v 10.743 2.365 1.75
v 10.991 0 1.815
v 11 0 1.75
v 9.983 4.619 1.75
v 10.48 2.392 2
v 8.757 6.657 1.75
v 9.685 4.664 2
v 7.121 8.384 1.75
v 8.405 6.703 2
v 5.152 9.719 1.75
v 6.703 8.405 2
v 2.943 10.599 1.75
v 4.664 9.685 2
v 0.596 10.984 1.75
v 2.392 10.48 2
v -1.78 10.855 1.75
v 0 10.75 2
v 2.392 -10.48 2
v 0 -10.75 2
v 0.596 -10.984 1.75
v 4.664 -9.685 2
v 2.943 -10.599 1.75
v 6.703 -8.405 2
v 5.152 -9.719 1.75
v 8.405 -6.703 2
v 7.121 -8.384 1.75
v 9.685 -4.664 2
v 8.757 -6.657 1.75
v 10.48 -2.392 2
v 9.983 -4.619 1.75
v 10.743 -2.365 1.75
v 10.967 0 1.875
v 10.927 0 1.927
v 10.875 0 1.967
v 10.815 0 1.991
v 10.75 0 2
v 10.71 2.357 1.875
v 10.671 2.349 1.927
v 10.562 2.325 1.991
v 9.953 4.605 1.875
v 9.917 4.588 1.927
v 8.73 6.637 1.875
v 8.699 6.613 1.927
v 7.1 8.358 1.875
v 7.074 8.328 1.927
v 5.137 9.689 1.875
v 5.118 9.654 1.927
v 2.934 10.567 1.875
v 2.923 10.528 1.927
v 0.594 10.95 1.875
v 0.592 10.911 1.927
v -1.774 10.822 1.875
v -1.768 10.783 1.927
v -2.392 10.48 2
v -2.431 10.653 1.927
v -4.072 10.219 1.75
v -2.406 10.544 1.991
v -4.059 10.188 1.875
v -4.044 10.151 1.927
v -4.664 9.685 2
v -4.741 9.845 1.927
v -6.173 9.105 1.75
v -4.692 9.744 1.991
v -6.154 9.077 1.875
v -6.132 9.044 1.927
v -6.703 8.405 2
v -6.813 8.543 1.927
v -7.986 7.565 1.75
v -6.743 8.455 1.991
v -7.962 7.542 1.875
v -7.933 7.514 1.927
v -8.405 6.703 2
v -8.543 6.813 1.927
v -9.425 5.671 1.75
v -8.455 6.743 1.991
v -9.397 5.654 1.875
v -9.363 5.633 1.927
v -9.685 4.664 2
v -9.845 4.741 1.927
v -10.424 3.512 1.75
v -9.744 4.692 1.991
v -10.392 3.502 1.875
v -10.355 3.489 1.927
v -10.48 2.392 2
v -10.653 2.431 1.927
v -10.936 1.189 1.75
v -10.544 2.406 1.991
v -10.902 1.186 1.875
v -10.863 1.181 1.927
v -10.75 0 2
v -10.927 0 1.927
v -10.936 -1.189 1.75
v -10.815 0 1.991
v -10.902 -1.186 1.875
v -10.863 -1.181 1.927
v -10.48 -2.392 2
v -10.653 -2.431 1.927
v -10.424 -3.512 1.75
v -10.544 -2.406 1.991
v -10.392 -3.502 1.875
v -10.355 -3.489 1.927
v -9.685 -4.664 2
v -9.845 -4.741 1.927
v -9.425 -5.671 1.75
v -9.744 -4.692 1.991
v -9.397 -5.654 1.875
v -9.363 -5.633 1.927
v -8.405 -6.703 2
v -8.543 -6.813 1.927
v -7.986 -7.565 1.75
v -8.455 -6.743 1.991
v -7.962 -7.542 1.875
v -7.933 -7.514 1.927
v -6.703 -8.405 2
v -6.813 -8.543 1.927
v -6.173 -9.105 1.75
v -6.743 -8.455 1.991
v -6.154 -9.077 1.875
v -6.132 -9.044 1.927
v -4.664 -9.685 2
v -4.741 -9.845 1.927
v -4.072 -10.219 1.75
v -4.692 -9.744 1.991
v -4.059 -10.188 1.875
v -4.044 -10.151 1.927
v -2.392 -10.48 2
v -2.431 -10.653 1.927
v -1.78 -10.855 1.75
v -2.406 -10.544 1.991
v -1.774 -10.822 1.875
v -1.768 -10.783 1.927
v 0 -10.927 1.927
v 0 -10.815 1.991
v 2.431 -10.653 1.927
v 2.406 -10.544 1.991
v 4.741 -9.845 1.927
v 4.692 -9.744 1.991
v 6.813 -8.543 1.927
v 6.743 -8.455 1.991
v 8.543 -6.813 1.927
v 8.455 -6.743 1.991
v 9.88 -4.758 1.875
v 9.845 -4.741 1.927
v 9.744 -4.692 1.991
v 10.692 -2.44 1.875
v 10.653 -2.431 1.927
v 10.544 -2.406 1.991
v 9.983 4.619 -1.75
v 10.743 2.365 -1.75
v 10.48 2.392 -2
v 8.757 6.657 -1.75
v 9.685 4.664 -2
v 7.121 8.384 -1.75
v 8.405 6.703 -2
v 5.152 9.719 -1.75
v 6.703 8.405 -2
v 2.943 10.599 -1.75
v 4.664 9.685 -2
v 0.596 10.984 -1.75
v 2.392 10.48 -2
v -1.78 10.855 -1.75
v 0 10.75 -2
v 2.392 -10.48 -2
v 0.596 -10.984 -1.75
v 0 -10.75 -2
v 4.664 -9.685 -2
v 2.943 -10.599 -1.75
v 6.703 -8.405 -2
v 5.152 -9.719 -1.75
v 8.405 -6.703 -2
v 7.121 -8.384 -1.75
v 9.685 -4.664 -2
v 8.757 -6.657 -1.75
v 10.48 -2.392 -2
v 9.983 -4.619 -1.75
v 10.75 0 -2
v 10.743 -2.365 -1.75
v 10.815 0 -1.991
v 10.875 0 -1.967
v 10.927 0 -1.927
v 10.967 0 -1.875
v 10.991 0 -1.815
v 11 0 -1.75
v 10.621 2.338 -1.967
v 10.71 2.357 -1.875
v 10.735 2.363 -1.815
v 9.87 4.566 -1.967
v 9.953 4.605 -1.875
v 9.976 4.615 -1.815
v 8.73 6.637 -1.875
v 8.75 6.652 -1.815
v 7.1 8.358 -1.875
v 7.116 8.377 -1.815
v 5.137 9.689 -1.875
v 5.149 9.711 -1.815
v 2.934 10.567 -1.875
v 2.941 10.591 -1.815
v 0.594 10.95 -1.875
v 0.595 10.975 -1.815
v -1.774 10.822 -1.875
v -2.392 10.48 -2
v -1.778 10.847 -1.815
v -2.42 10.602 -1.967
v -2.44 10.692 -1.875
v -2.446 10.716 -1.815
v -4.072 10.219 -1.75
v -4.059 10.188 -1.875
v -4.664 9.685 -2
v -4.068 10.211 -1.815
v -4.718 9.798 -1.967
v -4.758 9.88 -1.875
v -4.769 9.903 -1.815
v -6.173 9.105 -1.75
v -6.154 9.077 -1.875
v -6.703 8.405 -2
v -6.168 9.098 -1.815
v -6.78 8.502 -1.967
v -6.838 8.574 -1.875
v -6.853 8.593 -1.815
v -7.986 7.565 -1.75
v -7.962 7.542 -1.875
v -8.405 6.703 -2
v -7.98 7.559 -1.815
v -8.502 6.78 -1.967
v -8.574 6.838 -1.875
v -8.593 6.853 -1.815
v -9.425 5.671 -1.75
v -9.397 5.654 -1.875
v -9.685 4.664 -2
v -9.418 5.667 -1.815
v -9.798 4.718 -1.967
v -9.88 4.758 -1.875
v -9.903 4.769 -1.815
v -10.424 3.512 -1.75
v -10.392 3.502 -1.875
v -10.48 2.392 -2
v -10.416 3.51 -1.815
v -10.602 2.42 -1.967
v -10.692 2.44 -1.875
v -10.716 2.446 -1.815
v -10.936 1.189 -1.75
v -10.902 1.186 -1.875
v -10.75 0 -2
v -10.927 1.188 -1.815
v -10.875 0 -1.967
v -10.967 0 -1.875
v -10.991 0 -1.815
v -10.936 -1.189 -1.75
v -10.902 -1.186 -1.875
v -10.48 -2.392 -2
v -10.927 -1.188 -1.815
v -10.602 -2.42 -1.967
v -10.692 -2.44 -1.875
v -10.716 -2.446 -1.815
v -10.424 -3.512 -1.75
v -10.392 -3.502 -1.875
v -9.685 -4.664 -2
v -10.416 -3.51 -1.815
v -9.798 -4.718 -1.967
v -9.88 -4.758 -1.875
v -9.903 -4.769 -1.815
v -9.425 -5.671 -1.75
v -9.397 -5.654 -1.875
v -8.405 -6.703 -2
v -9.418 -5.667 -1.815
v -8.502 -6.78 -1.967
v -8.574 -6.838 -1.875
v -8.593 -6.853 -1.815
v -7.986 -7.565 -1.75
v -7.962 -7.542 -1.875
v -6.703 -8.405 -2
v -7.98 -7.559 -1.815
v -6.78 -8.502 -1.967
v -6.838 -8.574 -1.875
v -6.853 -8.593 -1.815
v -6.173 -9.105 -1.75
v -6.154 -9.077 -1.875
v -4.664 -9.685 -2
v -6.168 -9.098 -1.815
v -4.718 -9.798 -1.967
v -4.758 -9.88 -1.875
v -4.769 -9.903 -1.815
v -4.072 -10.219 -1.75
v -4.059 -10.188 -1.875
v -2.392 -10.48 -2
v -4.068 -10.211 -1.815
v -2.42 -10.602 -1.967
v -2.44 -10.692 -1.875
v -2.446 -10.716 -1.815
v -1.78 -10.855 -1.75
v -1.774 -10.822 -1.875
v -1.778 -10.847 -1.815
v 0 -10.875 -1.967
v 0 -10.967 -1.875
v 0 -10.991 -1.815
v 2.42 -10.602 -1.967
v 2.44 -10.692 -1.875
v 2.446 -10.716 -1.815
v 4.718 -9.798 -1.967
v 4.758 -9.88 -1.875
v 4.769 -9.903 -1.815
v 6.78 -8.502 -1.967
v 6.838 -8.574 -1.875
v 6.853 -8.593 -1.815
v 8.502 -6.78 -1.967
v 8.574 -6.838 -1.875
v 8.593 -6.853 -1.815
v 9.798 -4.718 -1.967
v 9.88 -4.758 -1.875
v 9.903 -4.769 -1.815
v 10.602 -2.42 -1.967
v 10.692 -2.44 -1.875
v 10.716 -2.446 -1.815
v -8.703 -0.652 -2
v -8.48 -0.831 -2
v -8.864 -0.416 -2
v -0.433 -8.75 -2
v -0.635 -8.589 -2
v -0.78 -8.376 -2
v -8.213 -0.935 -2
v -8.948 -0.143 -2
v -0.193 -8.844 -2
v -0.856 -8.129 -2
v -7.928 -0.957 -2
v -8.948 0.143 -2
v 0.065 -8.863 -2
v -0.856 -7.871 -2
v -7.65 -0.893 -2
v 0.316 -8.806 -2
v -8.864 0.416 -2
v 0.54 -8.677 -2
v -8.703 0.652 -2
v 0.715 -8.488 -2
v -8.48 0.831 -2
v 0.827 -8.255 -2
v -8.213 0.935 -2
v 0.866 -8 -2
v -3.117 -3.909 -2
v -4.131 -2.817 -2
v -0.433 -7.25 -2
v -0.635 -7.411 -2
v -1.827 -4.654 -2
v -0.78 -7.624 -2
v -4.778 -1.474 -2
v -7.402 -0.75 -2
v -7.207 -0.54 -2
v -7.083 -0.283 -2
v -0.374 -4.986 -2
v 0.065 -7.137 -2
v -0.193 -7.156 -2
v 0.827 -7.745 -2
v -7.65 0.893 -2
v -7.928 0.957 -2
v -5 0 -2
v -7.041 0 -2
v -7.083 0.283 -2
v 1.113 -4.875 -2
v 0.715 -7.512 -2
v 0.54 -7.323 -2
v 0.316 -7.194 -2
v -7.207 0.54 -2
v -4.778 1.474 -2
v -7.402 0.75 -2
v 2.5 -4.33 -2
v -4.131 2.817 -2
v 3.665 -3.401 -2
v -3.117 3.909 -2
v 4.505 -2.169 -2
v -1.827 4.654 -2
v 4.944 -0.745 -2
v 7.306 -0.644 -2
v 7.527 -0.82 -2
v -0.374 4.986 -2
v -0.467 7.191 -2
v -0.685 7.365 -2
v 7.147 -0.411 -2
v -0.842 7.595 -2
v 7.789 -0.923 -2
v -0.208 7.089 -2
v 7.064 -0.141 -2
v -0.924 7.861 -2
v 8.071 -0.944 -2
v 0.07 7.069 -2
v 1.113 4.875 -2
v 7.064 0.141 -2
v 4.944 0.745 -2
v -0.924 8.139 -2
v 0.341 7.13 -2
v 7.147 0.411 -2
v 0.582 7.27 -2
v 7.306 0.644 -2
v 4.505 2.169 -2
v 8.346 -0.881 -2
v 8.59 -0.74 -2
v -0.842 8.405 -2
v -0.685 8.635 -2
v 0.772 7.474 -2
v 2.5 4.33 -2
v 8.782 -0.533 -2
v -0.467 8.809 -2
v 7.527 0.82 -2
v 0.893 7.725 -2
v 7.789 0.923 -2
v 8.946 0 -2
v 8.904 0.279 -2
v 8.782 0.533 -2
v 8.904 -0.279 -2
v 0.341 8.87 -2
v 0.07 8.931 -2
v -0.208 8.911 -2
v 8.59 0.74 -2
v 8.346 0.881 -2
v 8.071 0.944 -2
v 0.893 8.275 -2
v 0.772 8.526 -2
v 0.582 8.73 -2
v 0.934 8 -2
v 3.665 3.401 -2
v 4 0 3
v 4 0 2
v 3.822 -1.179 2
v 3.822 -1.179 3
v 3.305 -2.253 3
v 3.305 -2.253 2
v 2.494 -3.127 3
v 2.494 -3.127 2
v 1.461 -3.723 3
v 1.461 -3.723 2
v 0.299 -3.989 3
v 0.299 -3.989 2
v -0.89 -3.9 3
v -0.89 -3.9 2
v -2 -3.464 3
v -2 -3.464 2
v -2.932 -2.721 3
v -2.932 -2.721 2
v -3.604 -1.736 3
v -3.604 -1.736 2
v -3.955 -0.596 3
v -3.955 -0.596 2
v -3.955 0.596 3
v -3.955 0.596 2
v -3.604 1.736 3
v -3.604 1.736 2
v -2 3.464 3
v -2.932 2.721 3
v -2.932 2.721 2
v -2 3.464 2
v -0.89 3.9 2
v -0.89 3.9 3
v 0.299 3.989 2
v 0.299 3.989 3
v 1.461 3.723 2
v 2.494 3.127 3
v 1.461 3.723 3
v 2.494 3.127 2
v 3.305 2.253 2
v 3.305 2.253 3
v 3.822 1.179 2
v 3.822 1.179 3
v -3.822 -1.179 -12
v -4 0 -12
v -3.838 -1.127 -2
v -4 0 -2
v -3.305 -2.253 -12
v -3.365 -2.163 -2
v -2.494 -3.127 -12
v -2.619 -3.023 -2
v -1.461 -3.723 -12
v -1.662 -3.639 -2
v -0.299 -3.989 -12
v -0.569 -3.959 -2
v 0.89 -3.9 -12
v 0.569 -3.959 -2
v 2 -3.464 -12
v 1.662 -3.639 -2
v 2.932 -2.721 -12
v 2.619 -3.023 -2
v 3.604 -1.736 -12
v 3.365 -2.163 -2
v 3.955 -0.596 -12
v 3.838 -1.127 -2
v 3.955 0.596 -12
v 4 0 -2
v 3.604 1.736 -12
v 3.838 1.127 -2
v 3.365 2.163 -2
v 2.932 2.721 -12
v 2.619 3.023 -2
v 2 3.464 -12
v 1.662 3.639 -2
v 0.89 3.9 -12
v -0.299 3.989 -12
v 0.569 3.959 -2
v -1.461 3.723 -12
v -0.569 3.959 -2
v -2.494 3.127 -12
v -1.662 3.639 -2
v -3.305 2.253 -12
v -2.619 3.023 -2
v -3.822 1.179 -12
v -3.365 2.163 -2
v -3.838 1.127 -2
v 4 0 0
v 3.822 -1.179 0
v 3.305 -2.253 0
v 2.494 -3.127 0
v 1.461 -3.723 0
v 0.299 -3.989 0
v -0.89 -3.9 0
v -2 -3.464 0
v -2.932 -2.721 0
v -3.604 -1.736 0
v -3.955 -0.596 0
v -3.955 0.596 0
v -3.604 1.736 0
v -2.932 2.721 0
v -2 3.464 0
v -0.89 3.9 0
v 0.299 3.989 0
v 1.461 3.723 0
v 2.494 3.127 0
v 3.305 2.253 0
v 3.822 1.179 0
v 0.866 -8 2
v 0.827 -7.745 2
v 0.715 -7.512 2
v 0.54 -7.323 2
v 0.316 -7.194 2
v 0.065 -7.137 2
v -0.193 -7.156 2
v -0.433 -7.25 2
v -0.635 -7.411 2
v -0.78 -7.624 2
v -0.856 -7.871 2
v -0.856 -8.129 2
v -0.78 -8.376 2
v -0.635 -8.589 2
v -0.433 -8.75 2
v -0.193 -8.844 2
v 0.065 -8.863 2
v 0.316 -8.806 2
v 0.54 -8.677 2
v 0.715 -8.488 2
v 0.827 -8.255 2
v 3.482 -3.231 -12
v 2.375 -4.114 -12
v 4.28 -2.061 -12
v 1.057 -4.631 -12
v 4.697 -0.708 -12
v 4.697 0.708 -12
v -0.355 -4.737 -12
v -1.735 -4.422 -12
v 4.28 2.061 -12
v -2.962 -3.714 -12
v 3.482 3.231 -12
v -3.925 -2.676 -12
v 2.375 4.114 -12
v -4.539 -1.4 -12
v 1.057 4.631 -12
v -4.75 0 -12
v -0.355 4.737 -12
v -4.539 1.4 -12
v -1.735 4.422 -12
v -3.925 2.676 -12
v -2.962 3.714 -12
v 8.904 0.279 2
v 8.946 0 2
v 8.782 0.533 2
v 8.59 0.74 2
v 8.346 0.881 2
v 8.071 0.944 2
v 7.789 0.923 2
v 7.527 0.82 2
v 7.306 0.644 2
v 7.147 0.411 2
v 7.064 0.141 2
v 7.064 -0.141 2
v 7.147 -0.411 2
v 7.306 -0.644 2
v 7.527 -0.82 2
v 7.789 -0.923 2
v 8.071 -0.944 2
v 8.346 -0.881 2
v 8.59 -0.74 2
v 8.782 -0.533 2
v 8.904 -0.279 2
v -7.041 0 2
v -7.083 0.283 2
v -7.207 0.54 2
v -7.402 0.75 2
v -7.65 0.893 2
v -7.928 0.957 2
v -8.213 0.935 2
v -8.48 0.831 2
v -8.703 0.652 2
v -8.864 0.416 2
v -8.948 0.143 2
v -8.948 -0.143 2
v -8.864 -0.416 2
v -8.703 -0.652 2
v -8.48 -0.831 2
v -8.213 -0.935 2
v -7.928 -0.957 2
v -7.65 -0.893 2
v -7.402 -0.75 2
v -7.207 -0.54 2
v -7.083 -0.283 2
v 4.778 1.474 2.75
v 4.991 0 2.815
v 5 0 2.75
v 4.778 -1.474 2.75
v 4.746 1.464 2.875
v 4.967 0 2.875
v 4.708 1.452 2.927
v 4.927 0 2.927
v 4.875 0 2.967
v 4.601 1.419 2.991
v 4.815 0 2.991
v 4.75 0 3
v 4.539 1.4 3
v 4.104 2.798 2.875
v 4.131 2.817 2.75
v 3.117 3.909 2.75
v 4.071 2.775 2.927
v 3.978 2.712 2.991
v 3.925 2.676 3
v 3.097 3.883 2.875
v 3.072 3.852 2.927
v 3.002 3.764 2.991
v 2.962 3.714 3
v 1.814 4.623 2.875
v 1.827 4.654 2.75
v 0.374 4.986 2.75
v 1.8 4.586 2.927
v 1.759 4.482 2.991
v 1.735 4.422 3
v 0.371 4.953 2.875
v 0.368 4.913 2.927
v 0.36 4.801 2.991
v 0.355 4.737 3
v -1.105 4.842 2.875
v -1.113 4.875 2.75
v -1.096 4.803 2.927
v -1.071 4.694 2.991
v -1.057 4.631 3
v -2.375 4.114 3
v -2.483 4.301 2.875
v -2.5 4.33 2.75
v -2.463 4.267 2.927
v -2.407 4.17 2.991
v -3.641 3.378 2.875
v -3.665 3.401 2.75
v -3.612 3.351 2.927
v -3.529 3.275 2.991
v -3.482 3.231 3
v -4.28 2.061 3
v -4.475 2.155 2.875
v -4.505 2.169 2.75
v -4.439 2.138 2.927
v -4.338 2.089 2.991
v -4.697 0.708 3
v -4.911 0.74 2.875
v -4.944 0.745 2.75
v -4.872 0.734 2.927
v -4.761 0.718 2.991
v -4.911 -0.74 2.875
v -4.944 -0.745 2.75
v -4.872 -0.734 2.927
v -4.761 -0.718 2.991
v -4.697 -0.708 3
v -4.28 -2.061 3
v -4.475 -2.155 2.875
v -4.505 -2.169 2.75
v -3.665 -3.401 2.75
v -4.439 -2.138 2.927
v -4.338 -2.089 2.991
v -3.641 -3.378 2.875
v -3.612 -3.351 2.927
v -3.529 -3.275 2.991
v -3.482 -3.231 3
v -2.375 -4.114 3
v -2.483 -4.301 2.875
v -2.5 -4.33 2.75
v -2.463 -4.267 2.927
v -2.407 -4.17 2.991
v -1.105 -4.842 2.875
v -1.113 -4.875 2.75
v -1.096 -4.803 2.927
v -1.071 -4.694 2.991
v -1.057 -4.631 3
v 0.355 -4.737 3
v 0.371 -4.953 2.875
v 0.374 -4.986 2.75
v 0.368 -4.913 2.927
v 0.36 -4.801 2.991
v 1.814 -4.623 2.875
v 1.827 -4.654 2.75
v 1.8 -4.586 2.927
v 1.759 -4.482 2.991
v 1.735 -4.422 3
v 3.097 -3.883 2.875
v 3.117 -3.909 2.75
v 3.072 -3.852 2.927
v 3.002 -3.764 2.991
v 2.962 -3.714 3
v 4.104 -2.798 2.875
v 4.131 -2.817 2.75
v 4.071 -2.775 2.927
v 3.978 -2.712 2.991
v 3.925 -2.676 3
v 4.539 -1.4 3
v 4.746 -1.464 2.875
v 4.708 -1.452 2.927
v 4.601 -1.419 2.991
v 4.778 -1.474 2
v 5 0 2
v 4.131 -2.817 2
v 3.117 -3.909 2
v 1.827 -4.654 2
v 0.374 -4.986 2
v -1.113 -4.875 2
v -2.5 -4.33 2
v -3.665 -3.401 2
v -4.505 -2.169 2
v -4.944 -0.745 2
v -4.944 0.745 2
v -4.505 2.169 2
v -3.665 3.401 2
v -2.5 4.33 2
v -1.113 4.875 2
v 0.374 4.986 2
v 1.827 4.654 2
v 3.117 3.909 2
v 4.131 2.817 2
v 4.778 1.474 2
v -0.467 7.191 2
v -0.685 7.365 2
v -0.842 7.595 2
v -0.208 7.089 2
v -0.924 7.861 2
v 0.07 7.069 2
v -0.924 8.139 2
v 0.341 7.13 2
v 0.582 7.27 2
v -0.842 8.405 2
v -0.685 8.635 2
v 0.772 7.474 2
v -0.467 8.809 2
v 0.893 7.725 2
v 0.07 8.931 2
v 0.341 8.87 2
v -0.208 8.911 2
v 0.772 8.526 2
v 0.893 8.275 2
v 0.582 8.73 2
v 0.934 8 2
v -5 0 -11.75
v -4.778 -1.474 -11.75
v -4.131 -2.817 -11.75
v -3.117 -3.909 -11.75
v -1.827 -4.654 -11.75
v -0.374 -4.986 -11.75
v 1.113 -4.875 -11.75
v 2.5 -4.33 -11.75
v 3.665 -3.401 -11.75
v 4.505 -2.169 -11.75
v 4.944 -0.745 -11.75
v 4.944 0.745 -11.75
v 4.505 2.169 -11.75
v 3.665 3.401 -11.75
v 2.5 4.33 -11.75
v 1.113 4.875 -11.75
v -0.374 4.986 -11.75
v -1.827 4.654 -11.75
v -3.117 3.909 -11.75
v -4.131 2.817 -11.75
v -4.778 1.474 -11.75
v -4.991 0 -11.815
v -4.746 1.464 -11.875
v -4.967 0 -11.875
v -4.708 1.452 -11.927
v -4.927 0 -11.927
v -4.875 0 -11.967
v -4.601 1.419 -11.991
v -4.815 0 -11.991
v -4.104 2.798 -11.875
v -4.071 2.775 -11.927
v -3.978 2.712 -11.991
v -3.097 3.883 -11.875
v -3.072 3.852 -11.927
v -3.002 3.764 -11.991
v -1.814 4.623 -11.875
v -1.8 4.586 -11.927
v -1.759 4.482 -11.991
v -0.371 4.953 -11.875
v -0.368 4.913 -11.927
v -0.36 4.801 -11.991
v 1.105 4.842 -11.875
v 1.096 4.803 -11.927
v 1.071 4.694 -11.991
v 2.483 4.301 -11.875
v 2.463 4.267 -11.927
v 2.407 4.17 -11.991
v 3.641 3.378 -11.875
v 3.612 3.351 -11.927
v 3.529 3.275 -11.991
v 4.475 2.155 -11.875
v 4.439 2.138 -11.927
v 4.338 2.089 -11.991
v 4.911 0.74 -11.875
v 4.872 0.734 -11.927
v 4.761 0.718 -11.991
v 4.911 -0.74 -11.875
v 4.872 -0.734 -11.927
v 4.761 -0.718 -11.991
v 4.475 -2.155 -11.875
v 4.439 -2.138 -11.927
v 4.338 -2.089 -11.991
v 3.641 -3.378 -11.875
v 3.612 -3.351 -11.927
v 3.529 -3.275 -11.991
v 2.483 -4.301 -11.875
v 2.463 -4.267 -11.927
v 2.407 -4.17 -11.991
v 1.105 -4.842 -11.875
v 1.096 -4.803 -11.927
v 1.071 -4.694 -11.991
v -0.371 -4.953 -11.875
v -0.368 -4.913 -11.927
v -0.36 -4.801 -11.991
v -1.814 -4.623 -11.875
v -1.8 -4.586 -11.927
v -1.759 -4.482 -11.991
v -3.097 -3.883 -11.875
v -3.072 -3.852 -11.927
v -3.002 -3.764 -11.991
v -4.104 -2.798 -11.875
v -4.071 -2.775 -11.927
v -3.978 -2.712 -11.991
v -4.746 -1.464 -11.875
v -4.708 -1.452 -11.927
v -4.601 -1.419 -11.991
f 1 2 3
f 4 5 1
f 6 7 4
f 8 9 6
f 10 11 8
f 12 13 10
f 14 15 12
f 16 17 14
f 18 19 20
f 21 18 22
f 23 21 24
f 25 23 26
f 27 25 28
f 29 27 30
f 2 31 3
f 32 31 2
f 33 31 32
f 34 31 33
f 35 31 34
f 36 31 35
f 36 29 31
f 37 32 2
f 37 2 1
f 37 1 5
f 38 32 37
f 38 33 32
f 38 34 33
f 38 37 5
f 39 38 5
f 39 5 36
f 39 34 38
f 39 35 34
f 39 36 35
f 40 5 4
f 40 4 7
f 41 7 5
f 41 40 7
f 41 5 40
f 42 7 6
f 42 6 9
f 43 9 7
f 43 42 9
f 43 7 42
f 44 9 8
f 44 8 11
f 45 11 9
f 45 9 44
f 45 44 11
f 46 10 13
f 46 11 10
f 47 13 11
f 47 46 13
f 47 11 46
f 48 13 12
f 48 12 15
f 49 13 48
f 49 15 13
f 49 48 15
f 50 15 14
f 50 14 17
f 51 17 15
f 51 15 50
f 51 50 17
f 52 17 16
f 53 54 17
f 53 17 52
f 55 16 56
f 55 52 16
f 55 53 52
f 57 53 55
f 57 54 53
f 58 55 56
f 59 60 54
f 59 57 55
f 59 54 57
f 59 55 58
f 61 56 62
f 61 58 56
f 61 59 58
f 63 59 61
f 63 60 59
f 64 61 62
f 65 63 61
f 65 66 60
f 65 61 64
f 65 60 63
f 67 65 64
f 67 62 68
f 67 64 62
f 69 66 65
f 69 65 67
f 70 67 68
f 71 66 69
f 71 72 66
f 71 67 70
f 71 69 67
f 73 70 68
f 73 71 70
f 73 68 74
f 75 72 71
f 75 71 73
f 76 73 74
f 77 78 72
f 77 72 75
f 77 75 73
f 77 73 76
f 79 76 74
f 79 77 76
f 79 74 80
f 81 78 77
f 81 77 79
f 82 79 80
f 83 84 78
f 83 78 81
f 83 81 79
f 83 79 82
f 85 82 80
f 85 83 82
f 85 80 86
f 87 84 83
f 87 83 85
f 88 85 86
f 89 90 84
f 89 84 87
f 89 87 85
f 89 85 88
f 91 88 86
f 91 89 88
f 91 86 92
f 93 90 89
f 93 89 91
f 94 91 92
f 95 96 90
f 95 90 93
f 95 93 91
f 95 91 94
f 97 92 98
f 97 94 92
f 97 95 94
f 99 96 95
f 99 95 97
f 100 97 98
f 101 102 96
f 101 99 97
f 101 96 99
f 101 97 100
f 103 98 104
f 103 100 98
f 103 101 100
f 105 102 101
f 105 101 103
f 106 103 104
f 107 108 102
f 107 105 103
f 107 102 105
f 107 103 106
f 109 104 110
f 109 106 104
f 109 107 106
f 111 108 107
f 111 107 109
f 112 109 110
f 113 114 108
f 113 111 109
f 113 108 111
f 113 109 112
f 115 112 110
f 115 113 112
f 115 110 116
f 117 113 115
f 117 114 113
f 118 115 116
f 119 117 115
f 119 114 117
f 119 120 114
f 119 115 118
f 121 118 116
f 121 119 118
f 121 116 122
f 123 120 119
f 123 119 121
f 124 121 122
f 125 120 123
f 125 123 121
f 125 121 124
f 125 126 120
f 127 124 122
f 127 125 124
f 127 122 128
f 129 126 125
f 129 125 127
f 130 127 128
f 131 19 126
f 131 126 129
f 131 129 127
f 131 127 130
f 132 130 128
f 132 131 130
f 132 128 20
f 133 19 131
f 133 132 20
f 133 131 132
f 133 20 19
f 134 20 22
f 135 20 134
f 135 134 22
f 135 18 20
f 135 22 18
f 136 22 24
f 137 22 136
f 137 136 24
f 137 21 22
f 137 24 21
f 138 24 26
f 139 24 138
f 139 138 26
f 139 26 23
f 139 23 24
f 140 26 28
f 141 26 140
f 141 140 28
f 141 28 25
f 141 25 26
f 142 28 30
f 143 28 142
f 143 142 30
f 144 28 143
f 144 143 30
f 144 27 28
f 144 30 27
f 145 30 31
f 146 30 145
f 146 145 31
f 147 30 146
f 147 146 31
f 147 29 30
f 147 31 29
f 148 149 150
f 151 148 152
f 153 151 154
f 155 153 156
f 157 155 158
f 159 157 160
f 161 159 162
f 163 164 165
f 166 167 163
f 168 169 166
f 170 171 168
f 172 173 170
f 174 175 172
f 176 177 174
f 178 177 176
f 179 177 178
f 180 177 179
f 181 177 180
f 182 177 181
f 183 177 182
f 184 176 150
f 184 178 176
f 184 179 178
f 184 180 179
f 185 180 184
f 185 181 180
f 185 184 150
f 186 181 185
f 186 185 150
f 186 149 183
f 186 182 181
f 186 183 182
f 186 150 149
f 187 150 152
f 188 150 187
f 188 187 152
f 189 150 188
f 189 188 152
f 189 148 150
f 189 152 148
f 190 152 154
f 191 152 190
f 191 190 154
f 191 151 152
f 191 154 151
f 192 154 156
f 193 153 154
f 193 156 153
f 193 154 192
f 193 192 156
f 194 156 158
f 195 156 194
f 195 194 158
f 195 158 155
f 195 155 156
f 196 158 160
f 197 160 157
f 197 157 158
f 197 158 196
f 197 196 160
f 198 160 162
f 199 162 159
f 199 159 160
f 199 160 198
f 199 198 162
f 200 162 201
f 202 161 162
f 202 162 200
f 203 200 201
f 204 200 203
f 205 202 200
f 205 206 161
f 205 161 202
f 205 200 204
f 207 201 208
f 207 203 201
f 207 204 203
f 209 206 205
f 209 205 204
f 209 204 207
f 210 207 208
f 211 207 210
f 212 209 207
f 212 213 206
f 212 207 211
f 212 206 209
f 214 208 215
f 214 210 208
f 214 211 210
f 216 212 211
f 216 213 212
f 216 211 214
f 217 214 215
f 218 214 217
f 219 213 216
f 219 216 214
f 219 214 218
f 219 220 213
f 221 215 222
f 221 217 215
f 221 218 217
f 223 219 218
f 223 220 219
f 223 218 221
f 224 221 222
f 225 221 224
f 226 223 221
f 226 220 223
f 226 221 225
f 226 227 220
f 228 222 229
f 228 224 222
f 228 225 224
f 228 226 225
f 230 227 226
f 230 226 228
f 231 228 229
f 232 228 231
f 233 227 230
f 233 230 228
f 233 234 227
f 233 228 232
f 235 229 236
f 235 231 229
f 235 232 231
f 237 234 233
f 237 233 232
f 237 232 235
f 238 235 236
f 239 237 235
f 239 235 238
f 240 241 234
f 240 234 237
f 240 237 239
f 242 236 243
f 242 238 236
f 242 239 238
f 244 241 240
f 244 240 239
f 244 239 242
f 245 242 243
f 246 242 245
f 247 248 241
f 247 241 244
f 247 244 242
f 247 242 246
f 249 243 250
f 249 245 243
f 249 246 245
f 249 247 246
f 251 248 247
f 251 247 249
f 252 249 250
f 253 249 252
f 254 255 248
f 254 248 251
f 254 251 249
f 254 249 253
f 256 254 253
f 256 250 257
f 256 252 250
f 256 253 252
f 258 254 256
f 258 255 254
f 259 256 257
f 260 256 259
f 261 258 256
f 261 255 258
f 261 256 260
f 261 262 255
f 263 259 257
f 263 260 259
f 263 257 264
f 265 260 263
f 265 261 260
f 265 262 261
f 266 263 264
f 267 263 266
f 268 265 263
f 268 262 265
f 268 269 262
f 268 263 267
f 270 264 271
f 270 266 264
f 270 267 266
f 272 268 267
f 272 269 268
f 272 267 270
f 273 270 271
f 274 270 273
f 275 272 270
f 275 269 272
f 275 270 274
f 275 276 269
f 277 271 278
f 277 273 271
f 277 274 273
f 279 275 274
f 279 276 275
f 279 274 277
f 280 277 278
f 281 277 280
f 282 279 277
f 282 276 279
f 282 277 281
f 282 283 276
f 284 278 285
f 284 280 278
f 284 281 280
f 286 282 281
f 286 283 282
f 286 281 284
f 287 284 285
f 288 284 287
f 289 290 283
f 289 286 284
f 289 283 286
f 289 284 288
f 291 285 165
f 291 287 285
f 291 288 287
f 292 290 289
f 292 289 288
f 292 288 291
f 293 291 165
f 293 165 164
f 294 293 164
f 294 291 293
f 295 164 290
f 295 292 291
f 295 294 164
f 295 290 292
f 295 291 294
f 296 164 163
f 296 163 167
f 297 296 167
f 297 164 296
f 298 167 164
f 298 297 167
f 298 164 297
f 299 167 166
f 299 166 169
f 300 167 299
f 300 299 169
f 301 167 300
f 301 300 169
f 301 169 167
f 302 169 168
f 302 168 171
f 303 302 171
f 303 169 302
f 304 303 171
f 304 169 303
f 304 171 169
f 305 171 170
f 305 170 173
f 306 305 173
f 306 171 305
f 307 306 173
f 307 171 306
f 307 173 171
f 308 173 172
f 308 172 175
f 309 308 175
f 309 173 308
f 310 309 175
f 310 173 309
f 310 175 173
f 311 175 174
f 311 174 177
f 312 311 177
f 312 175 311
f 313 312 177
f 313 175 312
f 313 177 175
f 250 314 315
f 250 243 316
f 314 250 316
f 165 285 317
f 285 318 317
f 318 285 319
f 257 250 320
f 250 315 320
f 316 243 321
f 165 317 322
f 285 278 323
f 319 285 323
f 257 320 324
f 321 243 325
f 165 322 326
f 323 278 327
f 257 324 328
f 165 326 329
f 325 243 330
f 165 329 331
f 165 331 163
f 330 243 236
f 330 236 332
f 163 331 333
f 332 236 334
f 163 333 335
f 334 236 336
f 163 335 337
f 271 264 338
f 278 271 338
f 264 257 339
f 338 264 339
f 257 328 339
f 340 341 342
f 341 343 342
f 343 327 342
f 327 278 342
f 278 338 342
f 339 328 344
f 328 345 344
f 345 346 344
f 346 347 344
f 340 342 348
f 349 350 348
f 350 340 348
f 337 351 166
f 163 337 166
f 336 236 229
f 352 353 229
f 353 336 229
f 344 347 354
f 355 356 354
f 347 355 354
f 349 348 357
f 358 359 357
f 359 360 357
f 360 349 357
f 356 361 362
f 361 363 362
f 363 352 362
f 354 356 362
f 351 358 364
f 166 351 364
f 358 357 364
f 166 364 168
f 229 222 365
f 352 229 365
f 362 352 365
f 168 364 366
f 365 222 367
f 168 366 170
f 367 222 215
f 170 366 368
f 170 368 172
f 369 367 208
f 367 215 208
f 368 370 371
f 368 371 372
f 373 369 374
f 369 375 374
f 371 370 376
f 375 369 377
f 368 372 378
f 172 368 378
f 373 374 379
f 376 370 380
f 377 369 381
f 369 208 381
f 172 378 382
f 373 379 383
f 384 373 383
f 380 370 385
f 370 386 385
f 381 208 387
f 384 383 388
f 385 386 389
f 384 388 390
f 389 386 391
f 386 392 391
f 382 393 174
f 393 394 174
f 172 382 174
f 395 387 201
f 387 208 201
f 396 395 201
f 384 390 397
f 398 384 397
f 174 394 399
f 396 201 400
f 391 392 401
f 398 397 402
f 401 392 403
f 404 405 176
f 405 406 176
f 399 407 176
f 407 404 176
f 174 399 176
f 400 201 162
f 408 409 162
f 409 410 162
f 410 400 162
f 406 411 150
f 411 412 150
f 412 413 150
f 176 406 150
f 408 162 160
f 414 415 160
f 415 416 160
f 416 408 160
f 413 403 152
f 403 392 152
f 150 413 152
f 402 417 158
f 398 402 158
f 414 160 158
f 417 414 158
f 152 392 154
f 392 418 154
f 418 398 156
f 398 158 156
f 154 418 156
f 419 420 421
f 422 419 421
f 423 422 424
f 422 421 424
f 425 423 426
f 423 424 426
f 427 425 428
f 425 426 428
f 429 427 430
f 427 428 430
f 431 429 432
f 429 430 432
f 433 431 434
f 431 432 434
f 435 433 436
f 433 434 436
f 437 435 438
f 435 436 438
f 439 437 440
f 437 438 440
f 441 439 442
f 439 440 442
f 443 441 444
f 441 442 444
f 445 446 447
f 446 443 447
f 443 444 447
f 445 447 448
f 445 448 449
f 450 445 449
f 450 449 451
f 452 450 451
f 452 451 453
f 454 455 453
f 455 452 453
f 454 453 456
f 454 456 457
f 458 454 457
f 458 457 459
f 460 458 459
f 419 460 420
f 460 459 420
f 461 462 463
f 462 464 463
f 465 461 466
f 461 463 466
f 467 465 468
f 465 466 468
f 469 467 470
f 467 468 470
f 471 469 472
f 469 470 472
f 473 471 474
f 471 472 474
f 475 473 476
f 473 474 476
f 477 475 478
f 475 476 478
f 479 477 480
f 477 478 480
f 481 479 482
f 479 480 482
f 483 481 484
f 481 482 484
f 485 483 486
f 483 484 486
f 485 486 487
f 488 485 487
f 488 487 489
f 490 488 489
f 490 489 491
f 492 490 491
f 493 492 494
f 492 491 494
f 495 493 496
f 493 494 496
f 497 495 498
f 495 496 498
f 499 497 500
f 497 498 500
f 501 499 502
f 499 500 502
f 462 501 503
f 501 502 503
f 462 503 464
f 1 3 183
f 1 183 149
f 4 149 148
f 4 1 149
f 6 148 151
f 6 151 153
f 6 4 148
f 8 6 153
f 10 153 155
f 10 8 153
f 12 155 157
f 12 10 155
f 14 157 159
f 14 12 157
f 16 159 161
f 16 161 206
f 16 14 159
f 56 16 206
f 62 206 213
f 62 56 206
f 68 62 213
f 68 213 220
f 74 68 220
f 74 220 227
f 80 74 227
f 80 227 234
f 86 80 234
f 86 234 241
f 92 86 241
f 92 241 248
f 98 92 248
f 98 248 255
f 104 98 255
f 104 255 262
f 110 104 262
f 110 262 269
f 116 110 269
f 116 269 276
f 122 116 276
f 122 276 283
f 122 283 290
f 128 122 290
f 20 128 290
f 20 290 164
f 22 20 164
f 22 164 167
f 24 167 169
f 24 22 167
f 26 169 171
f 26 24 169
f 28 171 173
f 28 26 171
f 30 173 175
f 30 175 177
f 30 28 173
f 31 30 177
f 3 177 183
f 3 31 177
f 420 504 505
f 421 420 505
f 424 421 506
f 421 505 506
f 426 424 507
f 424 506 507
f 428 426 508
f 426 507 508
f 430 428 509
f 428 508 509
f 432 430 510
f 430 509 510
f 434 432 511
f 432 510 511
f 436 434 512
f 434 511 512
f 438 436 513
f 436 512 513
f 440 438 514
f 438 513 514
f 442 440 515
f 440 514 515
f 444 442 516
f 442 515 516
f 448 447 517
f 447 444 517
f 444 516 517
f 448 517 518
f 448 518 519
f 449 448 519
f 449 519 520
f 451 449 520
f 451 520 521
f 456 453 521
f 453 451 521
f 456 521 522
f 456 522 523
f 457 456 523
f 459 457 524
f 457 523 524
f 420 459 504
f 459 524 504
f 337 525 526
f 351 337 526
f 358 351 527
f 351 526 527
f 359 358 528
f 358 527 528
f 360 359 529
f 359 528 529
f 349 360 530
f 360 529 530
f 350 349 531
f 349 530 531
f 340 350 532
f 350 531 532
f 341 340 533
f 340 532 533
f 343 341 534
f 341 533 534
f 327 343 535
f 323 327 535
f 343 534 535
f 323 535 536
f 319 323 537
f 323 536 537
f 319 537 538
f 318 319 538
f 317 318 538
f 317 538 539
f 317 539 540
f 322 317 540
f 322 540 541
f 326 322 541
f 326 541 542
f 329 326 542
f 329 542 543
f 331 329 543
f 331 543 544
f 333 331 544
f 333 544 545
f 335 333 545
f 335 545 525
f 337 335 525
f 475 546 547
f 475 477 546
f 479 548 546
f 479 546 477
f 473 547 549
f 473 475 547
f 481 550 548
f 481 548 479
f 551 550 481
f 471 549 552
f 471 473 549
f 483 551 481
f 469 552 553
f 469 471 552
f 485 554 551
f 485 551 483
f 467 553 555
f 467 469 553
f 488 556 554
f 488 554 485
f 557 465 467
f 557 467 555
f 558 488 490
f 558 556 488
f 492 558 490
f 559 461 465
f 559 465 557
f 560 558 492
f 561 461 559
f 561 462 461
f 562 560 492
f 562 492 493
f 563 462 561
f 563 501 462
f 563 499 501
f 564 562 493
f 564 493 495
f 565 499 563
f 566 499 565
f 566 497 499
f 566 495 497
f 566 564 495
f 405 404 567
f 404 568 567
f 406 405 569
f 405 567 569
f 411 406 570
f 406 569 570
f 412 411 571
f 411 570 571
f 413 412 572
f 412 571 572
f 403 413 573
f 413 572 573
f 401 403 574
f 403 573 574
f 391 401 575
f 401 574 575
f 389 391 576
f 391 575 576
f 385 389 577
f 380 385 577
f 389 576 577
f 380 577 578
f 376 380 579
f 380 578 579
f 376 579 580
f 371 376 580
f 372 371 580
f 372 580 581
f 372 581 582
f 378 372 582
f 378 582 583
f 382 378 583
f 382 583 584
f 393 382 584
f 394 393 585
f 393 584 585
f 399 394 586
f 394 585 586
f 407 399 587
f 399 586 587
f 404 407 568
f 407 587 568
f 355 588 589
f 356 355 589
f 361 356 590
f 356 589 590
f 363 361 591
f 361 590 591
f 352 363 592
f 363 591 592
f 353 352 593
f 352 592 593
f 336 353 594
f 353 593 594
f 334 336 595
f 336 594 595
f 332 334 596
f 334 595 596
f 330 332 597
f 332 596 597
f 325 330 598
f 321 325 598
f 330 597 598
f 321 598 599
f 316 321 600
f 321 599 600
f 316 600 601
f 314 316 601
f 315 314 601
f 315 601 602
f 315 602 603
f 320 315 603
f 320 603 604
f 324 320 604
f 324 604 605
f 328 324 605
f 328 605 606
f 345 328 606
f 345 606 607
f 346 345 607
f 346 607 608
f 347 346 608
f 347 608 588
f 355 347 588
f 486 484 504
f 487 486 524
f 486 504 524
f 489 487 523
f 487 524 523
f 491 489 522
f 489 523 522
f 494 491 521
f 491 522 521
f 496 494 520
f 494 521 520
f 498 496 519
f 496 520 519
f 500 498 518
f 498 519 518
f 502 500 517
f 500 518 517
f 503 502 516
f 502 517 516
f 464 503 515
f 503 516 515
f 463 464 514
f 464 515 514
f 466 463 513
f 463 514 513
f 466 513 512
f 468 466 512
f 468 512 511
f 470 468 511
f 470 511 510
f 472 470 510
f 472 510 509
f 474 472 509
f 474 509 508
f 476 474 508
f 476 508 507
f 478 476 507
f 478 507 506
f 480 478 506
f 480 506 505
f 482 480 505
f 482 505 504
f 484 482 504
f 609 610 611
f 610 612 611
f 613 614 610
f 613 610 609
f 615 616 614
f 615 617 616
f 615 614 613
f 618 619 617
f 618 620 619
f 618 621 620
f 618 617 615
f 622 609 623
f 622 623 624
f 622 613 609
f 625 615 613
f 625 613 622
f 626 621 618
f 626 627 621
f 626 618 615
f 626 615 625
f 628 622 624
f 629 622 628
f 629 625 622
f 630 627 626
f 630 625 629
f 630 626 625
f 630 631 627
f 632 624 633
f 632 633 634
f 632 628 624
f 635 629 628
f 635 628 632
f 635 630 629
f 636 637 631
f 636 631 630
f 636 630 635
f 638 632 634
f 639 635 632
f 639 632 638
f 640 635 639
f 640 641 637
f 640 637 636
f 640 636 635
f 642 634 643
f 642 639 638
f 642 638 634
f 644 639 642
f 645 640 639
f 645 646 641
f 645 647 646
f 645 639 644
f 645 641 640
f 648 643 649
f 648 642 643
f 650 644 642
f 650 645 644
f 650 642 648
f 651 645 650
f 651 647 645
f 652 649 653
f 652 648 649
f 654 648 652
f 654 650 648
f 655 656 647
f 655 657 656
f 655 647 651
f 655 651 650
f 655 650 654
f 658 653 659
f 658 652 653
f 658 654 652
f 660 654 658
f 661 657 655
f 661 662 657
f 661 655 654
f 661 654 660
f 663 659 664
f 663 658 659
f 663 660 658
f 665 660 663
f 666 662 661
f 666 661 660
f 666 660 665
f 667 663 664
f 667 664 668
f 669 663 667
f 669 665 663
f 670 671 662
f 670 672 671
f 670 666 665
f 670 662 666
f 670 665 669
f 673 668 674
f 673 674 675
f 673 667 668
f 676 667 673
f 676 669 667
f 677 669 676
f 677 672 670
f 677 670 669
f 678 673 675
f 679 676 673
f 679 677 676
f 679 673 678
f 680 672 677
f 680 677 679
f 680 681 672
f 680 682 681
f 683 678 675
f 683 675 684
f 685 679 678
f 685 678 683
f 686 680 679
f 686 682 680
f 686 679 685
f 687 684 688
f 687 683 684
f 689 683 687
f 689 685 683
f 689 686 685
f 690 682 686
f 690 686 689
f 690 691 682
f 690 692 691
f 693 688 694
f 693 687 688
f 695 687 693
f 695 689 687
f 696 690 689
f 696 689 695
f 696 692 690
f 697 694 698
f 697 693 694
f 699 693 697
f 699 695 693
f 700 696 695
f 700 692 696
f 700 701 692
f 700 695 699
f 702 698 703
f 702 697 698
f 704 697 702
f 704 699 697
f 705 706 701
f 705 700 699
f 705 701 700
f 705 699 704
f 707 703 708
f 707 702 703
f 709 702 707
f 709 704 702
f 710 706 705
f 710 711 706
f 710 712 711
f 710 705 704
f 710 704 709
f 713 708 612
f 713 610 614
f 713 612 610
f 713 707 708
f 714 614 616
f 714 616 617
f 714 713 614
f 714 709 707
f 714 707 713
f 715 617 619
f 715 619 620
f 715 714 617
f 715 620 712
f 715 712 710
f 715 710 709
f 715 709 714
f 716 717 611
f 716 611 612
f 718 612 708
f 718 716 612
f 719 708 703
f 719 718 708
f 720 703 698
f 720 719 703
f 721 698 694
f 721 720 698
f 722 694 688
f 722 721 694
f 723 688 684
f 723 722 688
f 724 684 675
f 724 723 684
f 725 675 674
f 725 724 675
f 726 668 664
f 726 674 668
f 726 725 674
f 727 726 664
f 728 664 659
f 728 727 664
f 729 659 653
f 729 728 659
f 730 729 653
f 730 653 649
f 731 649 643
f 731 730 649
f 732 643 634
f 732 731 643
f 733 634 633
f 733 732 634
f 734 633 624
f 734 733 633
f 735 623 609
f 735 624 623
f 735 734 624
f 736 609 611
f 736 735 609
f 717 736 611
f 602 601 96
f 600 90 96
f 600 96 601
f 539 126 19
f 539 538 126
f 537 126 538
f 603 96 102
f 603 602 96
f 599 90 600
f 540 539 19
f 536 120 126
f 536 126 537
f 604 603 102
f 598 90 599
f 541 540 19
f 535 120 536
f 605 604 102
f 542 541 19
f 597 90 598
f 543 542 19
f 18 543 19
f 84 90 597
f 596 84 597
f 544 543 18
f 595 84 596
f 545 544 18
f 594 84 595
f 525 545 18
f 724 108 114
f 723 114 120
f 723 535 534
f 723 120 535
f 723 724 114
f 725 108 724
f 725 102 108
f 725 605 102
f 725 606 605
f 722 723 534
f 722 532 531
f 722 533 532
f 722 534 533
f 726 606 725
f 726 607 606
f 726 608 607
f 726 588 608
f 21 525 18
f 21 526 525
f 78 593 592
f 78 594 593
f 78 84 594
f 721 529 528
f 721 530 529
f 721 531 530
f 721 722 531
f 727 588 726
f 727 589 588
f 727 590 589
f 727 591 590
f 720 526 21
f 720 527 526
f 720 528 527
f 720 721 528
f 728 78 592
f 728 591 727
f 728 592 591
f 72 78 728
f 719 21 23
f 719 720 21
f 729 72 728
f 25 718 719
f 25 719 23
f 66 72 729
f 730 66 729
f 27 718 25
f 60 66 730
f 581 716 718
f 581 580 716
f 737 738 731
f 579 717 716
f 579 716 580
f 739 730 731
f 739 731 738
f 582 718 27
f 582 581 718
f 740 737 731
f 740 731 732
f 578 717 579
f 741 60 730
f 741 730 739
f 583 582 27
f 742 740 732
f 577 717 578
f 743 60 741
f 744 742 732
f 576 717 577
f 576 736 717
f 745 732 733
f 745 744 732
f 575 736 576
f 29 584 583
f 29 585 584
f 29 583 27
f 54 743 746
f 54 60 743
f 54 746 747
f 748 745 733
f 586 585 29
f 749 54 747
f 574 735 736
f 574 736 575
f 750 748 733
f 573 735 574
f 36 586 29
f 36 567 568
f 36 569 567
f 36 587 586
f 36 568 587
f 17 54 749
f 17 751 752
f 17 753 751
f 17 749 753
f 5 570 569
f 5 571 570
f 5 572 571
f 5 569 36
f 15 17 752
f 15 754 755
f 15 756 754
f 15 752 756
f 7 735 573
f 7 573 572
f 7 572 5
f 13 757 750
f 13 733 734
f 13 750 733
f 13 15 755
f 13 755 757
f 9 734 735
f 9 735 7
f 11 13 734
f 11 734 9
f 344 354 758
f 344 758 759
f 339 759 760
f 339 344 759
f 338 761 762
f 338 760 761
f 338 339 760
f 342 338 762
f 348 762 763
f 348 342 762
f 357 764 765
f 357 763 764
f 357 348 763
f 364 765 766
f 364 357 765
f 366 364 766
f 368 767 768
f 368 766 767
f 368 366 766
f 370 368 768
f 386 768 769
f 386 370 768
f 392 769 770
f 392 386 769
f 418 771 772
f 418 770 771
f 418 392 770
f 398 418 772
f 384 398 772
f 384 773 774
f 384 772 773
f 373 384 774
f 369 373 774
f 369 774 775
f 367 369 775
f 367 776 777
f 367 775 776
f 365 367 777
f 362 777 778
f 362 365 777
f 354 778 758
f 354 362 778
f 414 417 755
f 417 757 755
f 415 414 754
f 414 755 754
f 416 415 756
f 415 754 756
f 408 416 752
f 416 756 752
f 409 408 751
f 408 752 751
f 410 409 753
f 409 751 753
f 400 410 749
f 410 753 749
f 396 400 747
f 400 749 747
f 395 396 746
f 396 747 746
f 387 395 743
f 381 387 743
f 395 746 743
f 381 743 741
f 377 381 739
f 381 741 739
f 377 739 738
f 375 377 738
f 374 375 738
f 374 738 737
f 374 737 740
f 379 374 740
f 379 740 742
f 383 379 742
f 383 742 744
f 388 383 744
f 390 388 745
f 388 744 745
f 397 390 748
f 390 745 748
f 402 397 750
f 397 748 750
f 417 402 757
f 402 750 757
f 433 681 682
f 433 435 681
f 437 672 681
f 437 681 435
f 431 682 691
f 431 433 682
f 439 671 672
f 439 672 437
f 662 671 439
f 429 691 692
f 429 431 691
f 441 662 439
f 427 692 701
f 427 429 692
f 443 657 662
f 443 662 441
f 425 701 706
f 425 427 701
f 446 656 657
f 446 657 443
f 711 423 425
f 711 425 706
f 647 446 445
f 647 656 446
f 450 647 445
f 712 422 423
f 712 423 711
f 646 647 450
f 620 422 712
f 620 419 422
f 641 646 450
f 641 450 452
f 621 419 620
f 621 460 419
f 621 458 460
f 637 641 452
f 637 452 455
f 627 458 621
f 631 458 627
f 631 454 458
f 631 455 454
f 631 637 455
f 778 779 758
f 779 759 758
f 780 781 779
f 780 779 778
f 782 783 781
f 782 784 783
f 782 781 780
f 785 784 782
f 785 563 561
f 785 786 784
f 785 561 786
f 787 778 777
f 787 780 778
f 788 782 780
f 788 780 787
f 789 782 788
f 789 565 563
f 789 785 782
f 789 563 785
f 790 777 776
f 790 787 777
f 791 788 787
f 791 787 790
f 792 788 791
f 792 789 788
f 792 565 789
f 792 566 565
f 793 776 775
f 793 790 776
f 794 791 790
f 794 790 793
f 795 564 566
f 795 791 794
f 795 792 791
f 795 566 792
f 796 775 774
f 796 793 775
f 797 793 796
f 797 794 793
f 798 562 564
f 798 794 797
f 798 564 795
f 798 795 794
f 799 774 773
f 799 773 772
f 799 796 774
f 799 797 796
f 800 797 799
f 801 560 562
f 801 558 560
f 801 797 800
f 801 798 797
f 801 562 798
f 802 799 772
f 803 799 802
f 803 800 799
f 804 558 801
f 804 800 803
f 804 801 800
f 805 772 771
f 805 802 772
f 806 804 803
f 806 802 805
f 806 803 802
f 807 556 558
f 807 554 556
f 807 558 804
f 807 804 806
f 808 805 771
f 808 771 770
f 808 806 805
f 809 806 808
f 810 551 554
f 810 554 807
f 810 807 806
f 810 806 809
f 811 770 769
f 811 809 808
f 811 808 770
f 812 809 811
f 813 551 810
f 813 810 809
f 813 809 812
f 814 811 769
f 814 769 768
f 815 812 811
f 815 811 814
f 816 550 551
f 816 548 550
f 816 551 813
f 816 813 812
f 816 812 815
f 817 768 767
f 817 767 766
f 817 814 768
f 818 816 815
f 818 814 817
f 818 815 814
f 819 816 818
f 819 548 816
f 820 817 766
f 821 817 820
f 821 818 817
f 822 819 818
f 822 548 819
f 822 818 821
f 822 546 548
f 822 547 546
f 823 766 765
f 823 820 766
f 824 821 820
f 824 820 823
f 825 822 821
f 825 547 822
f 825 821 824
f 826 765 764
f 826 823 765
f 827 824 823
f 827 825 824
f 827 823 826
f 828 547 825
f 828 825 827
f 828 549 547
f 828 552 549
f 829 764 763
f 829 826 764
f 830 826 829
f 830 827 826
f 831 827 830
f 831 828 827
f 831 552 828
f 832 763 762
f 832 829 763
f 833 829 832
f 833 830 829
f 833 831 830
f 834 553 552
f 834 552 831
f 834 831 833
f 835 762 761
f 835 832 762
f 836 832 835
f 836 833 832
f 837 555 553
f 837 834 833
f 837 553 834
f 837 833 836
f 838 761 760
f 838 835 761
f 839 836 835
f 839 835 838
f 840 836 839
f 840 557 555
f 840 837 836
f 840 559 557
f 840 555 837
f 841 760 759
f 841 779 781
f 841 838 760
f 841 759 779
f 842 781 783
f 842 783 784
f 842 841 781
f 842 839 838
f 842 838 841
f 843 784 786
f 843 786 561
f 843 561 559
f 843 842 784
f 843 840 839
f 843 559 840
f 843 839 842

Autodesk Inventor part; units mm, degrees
ref_plane "YZ Plane" through (0, 0, 0) normal (1, 0, 0) x (0, 1, 0)
ref_plane "XZ Plane" through (0, 0, 0) normal (0, 1, 0) x (-1, 0, 0)
ref_plane "XY Plane" through (0, 0, 0) normal (0, 0, 1) x (1, 0, 0)
sketch "Sketch1" plane through (0, 0, 0) normal (0, 0, 1) x (1, 0, 0)
  circle A0 centre (0, 0) radius 11
  circle A1 centre (0, 0) radius 4
  dimension "d0" = 22
  dimension "d3" = 8
extrude "Extrusion2" add sketch "Sketch1" along normal mid plane 4
sketch "Sketch2" plane through (0, 0, 2) normal (0, 0, 1) x (1, 0, 0)
  circle A0 centre (0, 0) radius 4 projected
  circle A1 centre (0, 0) radius 11 projected
  circle A2 centre (0, 0) radius 5
  circle A3 centre (0, 0) radius 4
  dimension "d6" = 10
  dimension "d7" = 8
extrude "Extrusion3" add sketch "Sketch2" along normal blind 1 contours A2
sketch "Sketch3" plane through (0, 0, 2) normal (0, 0, 1) x (1, 0, 0)
  circle A0 centre (0, 0) radius 5 projected
  circle A1 centre (0, -8) radius 0.8657
  circle A2 centre (8, 0) radius 0.9464
  circle A3 centre (0, 8) radius 0.9341
  circle A4 centre (-8, 0) radius 0.9592
  dimension "d10" = 8
  dimension "d11" = 8
  dimension "d12" = 8
  dimension "d13" = 8
extrude "Extrusion4" cut sketch "Sketch3" against normal up to surface (4 mm away) contours A1 | A2 | A3 | A4
sketch "Sketch4" plane through (0, 0, -2) normal (0, 0, -1) x (-1, 0, 0)
  circle A0 centre (0, 0) radius 4 projected
  circle A1 centre (0, 0) radius 11 projected
  circle A2 centre (0, 0) radius 4
  circle A3 centre (0, 0) radius 5
  dimension "d16" = 10
extrude "Extrusion5" add sketch "Sketch4" along normal blind 10 contours A3
fillet "Fillet1" radius 0.25 4 edges at (-11, 0, -2) (-11, 0, 2) (5, 0, -12) (-5, 0, 3)
properties part number "Z Akse gevindstang møtrik" material "Brass, Soft Yellow"
